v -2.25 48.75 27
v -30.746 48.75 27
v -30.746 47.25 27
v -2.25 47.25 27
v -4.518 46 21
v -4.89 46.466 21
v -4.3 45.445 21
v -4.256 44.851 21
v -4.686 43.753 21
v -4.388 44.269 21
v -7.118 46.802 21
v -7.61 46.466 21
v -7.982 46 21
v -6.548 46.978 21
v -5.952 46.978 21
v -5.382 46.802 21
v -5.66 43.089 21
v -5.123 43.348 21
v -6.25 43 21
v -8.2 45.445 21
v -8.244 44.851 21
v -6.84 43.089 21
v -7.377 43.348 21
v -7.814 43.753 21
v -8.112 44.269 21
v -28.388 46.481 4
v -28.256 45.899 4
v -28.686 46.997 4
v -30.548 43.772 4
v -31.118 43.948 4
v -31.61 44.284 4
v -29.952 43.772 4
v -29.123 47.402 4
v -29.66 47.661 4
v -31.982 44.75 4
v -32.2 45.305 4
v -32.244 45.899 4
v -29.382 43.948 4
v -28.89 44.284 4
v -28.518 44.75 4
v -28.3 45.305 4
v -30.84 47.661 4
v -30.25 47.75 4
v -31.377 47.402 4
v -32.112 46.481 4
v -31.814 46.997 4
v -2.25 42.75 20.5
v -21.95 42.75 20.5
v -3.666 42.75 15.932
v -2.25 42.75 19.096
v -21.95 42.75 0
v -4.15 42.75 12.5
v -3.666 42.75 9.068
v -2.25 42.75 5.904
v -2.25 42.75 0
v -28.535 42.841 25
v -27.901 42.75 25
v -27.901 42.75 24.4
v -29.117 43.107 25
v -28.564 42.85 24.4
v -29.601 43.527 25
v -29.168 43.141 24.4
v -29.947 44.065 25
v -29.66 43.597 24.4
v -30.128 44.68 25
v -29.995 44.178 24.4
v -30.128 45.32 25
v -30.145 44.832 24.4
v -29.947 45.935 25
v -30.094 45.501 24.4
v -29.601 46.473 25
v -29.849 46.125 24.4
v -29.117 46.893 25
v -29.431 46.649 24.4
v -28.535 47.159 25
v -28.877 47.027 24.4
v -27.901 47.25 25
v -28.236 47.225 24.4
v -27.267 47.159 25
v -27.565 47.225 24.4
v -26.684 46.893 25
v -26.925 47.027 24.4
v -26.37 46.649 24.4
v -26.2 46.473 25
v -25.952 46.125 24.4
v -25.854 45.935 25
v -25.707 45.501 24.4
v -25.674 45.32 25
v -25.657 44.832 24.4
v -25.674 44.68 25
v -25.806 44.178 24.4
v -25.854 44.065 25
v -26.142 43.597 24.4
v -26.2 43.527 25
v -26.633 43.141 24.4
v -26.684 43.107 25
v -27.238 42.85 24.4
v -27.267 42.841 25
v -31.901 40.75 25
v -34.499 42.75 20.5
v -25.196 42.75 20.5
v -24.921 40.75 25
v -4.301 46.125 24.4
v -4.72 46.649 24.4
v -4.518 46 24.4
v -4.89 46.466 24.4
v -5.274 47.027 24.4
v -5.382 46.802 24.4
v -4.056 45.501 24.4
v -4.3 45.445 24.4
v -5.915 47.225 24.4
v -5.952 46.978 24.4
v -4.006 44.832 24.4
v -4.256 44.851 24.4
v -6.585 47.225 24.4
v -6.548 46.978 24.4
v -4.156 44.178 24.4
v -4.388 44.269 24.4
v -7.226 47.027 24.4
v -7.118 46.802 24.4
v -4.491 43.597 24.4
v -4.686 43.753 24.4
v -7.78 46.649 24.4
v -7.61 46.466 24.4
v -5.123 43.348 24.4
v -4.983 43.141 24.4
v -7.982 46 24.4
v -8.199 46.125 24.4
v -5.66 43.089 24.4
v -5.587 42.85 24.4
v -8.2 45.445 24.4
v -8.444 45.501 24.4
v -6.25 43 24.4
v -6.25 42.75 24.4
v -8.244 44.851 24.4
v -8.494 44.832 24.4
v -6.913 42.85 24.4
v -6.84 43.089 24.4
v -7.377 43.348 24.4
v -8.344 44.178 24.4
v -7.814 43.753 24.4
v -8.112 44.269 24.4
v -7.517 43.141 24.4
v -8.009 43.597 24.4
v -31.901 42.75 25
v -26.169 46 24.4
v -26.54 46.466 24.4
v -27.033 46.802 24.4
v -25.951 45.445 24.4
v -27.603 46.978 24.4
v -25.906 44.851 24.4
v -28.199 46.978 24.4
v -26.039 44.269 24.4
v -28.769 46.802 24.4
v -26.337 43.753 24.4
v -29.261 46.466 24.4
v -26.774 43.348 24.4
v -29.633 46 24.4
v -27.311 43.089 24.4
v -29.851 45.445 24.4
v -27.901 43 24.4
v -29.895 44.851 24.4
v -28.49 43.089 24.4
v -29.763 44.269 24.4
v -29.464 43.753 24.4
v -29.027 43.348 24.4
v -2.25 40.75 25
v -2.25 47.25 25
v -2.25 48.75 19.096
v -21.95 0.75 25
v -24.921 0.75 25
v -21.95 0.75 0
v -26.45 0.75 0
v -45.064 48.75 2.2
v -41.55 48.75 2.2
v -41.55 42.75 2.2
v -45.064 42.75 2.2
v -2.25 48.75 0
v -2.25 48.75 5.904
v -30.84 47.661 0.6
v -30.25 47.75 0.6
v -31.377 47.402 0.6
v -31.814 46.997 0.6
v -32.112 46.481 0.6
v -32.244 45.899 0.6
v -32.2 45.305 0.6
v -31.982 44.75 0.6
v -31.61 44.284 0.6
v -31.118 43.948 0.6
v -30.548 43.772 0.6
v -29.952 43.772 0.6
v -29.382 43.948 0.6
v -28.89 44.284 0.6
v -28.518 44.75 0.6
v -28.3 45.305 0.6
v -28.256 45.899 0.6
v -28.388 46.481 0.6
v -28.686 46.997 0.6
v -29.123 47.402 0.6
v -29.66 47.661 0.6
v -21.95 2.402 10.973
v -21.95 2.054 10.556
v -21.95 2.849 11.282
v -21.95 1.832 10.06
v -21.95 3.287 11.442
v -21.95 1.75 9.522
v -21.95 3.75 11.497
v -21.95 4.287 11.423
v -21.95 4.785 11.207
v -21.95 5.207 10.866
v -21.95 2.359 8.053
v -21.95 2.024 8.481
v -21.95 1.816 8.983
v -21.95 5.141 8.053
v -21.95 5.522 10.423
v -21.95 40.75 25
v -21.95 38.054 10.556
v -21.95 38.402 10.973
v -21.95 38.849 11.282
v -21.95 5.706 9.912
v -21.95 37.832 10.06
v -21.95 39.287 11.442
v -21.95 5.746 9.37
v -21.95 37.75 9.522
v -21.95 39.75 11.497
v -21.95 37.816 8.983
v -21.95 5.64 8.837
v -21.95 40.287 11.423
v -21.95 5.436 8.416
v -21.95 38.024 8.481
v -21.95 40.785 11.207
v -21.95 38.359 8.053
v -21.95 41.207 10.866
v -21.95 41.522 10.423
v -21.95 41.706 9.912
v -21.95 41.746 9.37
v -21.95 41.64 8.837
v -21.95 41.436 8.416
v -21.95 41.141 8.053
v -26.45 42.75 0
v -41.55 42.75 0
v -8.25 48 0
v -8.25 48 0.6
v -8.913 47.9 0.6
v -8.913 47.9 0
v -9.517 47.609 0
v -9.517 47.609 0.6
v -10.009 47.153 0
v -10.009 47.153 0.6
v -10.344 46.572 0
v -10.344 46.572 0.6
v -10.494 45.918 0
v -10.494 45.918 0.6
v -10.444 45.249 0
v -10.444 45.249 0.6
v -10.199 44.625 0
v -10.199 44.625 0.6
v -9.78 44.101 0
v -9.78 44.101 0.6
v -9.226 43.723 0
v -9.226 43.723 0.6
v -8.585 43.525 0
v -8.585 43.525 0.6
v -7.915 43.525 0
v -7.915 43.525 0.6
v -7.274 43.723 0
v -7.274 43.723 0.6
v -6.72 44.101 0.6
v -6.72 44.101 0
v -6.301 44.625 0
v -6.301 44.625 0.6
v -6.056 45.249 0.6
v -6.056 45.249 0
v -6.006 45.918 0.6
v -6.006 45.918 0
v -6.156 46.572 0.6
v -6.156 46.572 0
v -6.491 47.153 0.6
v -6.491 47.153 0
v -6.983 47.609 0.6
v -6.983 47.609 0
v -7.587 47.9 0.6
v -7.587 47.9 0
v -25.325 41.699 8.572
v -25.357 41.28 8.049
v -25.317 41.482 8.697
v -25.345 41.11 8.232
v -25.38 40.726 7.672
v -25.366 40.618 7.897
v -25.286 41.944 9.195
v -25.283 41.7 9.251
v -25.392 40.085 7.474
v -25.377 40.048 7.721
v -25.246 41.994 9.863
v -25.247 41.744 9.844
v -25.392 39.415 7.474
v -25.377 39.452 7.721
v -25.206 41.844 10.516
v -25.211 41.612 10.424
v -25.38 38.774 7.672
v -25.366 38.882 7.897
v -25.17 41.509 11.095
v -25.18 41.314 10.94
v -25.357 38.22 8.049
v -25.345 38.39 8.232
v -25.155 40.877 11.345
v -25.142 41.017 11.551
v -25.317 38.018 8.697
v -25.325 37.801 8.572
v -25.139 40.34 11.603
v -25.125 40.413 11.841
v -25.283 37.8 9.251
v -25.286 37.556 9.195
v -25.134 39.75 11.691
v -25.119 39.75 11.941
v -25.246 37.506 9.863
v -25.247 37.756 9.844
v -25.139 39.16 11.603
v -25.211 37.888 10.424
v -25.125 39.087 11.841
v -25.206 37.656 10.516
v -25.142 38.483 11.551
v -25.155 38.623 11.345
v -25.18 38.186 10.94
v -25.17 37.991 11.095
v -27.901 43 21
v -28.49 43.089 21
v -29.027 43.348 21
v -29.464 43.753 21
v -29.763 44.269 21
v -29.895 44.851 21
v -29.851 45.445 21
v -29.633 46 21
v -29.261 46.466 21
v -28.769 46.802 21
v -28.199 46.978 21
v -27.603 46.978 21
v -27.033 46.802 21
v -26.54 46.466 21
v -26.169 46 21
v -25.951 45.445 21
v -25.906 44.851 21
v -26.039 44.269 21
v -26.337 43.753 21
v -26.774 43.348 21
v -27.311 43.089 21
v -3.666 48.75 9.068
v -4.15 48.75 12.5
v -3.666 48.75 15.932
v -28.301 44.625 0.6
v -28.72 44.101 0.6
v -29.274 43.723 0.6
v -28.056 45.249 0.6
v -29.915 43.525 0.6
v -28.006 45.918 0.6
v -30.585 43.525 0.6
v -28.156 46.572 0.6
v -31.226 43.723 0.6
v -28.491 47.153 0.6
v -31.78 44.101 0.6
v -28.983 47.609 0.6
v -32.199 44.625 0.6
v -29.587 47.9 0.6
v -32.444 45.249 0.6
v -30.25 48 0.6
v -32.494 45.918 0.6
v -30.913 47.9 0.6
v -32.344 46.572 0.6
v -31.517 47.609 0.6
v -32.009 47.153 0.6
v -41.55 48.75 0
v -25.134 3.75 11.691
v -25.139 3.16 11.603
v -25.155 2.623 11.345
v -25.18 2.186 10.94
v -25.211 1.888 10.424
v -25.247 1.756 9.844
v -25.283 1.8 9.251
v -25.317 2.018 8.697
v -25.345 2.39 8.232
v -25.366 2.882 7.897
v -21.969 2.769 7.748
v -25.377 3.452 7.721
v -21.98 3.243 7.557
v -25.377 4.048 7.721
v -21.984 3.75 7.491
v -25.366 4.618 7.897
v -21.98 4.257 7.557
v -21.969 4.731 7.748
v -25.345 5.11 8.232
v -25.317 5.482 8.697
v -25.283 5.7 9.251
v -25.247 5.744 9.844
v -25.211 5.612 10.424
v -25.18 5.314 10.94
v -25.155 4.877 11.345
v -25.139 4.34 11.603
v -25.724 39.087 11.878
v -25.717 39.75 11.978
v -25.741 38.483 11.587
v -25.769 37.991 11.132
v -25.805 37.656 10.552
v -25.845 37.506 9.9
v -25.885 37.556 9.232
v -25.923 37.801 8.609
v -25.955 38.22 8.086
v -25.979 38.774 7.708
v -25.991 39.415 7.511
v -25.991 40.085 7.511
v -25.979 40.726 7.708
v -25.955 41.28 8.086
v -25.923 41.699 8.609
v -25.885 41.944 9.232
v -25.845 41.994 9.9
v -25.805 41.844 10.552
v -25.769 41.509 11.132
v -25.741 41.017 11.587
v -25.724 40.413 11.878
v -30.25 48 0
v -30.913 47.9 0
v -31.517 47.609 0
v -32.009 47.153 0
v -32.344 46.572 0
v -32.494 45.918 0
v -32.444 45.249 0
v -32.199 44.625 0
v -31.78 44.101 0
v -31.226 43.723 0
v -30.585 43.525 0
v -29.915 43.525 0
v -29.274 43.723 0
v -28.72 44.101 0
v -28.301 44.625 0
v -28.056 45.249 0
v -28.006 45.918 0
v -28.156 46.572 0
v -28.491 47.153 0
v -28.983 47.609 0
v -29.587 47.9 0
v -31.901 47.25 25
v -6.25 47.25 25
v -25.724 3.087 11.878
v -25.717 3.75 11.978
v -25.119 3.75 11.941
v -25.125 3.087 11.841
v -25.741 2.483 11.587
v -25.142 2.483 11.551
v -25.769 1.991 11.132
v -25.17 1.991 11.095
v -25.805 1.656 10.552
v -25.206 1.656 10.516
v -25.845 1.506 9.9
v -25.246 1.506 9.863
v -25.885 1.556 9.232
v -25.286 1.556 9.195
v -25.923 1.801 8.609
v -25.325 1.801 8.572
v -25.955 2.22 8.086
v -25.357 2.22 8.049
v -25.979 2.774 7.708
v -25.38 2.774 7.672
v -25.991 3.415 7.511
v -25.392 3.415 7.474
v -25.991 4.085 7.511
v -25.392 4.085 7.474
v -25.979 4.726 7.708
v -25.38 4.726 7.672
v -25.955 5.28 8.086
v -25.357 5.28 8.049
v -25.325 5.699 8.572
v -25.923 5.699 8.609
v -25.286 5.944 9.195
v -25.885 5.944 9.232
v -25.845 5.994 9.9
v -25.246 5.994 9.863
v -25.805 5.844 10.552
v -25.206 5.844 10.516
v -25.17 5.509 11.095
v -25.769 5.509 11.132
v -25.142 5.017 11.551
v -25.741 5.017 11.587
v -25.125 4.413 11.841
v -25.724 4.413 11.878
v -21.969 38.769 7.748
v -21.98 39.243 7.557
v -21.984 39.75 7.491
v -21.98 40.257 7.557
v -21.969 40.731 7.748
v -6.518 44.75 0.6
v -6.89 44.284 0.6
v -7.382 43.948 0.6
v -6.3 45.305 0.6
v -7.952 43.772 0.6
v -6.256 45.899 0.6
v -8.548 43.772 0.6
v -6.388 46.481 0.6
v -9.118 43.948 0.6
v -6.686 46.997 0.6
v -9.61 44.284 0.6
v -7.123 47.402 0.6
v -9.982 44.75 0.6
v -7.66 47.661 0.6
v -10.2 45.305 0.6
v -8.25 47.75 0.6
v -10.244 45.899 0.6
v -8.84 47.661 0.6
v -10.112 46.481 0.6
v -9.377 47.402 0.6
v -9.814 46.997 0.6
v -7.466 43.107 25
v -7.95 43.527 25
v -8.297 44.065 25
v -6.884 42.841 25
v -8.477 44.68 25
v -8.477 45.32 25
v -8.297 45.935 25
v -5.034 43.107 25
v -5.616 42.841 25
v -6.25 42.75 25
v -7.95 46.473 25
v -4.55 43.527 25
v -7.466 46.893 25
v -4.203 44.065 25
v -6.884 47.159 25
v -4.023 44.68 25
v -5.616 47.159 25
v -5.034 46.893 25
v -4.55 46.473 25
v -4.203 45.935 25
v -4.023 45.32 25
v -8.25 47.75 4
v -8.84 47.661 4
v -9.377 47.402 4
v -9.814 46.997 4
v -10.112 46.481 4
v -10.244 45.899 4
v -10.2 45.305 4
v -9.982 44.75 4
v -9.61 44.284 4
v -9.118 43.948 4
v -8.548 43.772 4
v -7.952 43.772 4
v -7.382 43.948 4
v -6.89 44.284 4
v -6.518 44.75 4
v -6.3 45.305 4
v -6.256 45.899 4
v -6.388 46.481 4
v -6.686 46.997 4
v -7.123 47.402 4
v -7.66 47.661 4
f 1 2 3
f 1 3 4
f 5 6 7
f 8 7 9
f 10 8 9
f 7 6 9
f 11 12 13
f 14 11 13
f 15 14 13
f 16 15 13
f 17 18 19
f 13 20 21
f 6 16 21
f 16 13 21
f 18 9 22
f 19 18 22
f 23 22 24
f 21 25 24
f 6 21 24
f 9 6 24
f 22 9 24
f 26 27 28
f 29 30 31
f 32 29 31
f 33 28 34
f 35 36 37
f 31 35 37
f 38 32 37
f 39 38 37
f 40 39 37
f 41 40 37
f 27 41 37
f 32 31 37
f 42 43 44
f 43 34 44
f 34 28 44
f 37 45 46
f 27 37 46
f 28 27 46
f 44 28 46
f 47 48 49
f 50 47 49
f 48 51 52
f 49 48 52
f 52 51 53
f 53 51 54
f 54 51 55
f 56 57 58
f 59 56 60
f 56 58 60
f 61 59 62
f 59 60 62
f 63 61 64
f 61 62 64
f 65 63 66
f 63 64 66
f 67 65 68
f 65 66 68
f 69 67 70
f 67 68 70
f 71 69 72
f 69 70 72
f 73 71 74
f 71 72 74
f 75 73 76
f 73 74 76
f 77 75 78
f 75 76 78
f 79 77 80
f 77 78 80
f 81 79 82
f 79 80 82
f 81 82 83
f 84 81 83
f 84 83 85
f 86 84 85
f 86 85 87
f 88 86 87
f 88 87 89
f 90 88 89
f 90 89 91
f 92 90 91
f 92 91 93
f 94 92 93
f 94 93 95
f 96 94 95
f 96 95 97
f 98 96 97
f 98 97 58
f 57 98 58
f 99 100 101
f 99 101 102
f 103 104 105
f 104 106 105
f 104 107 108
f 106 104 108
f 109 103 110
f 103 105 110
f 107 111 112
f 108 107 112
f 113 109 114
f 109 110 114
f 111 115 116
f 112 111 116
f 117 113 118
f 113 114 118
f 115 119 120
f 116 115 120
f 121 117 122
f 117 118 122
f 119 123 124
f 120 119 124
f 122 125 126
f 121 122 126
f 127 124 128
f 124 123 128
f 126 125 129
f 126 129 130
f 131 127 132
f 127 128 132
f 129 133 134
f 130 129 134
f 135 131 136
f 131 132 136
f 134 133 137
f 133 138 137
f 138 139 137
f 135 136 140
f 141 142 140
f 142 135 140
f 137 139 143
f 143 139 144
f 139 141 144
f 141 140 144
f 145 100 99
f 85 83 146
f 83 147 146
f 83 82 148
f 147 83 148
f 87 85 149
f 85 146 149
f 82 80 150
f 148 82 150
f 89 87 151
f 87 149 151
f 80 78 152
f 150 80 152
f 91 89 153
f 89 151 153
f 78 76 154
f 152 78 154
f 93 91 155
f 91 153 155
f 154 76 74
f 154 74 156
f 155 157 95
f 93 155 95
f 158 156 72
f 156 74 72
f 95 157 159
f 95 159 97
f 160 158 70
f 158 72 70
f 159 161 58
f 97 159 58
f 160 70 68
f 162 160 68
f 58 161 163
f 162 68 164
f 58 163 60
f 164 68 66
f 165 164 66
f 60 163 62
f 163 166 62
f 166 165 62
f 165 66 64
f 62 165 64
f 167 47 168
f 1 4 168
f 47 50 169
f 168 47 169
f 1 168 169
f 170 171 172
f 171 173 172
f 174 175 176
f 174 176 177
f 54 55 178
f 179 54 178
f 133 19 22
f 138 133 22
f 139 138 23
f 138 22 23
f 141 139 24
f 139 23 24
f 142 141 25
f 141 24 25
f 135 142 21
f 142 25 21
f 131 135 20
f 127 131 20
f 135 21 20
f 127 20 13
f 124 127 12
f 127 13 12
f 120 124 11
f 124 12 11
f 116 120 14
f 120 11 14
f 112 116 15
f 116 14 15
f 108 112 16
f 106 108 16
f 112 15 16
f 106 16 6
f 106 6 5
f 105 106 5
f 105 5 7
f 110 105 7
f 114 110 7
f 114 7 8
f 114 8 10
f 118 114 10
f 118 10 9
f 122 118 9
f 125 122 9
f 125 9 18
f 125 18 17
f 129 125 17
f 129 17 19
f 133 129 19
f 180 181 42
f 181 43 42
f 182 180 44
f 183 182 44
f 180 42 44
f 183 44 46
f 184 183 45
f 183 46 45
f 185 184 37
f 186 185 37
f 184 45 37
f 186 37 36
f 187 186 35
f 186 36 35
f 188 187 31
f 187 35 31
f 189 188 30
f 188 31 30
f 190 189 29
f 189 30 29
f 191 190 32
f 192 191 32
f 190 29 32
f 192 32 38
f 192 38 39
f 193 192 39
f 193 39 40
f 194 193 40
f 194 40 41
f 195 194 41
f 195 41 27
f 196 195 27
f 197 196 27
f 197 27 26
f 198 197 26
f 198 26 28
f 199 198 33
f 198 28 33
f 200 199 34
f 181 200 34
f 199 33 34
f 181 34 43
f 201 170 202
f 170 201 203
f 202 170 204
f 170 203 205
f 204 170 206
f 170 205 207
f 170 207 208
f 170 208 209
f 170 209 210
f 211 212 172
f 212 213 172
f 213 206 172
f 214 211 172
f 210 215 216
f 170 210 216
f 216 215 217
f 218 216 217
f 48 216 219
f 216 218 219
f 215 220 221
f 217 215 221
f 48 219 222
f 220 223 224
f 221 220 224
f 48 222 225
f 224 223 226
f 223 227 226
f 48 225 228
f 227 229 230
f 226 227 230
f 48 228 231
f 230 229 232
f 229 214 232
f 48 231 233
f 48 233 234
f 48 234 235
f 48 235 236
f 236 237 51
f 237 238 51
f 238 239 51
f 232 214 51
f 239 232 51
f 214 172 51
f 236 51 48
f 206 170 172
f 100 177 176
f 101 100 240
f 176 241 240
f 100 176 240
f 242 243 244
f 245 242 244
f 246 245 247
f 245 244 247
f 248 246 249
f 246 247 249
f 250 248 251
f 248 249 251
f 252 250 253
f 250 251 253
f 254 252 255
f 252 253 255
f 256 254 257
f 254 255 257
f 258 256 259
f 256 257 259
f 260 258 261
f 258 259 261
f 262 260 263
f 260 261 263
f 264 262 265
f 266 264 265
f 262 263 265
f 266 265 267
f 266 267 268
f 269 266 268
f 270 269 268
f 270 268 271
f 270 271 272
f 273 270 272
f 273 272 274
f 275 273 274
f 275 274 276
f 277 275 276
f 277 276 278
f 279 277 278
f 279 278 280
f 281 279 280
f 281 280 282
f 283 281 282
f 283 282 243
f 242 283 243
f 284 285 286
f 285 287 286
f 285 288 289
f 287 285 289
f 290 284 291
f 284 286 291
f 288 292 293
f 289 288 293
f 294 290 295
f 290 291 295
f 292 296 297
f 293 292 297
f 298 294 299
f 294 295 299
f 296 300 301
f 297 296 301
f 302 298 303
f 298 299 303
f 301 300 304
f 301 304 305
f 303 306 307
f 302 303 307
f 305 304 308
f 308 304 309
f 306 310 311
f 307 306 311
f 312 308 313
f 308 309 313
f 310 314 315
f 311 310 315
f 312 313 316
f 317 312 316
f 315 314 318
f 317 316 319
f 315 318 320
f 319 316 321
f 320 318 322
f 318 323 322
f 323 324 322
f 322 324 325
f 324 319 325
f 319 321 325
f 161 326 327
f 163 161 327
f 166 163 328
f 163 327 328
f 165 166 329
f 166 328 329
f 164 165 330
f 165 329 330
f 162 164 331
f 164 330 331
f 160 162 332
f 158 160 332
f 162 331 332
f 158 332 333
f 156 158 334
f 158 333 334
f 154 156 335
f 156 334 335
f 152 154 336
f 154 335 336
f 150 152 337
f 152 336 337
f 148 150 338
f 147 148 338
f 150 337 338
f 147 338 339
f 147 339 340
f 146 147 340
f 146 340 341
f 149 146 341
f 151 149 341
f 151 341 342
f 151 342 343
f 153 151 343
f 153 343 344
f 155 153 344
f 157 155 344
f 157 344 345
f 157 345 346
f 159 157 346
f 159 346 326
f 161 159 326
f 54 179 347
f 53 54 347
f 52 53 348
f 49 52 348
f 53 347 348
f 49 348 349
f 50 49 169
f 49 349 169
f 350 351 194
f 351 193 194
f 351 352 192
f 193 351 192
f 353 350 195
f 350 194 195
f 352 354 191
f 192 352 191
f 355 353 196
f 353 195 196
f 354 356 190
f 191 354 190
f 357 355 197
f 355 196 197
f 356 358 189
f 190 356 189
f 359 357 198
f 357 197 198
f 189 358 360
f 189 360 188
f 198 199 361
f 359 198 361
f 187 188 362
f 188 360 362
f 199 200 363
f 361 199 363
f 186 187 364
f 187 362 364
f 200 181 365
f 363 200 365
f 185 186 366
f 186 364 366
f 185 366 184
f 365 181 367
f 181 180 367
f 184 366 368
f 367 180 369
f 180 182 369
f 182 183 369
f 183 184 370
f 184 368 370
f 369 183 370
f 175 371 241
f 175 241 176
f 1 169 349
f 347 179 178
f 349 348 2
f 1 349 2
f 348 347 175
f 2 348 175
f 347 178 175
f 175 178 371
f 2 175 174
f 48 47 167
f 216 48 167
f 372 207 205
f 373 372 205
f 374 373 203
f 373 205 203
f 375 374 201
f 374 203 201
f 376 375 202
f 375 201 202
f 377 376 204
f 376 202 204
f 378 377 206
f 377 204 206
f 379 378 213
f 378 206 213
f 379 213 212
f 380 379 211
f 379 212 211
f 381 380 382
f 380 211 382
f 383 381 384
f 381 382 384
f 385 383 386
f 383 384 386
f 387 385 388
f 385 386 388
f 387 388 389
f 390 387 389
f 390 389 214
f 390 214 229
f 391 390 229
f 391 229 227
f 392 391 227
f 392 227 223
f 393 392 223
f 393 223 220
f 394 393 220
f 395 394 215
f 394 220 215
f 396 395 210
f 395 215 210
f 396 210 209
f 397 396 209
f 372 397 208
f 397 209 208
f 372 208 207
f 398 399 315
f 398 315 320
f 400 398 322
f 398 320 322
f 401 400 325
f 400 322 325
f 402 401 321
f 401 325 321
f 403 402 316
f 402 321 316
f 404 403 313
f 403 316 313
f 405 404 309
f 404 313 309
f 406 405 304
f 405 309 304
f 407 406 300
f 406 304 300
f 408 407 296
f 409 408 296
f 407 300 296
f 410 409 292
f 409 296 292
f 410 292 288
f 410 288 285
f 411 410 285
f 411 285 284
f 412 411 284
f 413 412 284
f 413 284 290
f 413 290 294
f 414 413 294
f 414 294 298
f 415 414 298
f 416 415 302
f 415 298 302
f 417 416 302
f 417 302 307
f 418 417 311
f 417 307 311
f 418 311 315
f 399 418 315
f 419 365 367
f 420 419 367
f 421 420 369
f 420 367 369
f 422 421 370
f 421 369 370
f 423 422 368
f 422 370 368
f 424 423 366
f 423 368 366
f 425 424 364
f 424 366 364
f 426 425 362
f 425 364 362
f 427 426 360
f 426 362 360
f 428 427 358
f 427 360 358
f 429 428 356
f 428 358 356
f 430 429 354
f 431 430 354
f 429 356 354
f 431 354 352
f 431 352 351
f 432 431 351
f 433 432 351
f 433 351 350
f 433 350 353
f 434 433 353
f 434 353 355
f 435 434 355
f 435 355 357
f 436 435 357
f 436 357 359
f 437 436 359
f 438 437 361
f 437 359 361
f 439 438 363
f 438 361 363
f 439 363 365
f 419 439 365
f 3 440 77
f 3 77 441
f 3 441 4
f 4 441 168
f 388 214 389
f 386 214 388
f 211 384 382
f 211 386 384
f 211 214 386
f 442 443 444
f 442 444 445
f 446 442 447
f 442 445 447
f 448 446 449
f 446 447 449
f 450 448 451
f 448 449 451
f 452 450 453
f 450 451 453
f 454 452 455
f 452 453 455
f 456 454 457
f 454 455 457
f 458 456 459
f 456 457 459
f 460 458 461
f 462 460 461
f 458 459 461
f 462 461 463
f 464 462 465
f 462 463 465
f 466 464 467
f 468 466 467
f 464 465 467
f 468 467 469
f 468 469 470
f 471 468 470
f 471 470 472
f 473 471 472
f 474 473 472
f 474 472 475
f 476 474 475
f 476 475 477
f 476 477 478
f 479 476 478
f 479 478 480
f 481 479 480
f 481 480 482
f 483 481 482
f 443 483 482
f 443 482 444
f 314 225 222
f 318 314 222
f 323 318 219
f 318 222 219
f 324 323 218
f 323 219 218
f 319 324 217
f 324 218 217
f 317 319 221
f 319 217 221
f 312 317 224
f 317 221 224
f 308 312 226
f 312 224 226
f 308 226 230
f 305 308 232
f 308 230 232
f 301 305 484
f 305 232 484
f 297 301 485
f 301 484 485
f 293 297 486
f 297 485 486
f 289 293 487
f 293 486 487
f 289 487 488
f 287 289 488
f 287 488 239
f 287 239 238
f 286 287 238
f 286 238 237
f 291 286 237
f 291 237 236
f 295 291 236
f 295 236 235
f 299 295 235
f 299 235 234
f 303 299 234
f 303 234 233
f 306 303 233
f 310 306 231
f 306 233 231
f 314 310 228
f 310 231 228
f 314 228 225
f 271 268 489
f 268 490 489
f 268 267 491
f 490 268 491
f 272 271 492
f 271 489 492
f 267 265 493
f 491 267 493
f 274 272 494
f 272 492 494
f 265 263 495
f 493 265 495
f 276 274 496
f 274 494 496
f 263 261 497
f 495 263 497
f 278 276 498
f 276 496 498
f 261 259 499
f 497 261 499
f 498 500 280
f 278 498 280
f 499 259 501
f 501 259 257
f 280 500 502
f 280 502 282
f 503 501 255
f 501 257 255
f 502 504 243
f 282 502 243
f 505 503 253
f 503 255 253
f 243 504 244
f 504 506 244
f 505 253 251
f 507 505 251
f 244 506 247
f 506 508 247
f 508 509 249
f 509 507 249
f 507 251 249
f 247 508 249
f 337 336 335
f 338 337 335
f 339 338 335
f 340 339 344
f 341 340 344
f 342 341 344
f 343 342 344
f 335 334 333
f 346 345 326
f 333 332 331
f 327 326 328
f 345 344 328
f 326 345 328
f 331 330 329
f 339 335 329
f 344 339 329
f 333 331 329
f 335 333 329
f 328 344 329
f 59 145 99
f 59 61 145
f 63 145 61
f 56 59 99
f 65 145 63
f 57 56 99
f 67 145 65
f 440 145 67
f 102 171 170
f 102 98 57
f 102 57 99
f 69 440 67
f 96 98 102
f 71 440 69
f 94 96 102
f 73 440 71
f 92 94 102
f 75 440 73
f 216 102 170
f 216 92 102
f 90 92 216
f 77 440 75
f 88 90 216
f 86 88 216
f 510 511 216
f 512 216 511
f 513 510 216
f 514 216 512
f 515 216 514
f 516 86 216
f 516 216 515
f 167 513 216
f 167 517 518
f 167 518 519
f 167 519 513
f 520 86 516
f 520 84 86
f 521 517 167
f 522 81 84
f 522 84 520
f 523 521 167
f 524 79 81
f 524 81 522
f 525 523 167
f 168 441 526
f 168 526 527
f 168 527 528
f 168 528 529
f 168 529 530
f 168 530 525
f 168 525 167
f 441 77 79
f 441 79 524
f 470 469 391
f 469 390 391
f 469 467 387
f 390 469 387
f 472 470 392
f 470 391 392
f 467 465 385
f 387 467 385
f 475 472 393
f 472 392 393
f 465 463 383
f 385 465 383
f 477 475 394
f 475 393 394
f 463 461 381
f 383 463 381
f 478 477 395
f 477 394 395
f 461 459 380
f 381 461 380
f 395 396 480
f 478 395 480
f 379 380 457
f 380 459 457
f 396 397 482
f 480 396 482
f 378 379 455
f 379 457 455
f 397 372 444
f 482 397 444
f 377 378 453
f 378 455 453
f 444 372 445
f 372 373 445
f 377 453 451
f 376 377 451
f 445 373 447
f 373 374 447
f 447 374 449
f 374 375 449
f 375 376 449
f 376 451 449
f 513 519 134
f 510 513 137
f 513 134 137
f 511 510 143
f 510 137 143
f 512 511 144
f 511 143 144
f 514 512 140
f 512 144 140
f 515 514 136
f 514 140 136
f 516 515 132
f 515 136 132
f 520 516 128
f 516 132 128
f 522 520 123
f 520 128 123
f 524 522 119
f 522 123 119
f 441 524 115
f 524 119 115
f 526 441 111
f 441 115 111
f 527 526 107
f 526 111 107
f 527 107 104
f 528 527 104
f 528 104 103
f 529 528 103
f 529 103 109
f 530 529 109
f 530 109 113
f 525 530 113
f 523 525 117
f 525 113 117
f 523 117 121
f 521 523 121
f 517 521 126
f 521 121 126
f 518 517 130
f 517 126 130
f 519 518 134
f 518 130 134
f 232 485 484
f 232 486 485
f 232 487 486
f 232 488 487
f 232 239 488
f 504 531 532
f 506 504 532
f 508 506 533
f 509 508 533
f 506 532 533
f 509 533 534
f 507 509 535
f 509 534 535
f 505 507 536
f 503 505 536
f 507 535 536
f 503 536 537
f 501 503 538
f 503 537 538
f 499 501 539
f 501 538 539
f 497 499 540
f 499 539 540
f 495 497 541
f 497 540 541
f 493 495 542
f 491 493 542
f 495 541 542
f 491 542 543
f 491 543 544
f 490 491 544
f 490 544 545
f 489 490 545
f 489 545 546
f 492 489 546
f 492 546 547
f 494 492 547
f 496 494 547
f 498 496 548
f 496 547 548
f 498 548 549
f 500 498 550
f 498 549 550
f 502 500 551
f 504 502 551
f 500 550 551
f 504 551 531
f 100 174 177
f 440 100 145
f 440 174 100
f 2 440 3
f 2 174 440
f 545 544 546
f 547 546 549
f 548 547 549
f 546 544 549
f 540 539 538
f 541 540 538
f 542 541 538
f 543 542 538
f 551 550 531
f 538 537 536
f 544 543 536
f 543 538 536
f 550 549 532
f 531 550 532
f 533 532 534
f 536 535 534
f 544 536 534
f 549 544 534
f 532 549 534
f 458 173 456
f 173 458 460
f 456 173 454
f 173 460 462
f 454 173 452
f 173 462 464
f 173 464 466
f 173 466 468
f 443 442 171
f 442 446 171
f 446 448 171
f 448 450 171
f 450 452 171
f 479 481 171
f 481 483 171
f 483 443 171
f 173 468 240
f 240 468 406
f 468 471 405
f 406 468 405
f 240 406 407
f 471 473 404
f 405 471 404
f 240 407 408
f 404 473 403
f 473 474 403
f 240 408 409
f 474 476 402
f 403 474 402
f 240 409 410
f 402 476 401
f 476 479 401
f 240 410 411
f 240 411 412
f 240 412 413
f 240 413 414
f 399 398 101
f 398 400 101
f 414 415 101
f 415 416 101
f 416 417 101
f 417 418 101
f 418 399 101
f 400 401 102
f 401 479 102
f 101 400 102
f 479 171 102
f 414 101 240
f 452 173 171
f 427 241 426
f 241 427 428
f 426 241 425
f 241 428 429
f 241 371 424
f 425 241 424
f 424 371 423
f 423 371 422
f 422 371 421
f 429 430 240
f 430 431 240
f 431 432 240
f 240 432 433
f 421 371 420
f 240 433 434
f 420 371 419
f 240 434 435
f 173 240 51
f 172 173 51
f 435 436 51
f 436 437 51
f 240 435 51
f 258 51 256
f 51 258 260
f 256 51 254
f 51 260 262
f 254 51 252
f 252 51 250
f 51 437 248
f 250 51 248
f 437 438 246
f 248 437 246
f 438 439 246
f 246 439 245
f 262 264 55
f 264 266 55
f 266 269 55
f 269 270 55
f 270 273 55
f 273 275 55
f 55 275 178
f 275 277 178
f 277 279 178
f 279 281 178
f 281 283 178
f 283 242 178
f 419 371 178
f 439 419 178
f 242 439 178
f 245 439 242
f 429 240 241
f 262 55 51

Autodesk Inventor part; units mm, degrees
ref_plane "YZ Plane" through (0, 0, 0) normal (1, 0, 0) x (0, 1, 0)
ref_plane "XZ Plane" through (0, 0, 0) normal (0, 1, 0) x (-1, 0, 0)
ref_plane "XY Plane" through (0, 0, 0) normal (0, 0, 1) x (1, 0, 0)
ref_plane "Work Plane1" through (0, 0, 0) normal (0, 0, 1) x (1, 0, 0)
sketch "Sketch1" plane through (0, 0, 0) normal (0, 0, 1) x (1, 0, 0)
  line L0 (22.75, 48.75) -> (-33.25, 48.75) construction
  line L1 (-46.45, 48.75) -> (-46.45, 42.75)
  line L2 (-21.95, 42.75) -> (-26.45, 42.75)
  line L3 (-26.45, 42.75) -> (-26.45, 0.75)
  line L4 (-26.45, 0.75) -> (-21.95, 0.75)
  line L5 (-21.95, 0.75) -> (-21.95, 42.75)
  line L6 (-46.45, 49) -> (-46.45, 41.0784) construction
  line L7 (-46.45, 42.75) -> (-2.25, 42.75)
  line L8 (-2.25, 42.75) -> (-2.25, 48.75)
  line L9 (-2.25, 48.75) -> (-46.45, 48.75)
  line L10 (22.75, -48.75) -> (22.75, 48.75) construction
  point P0 (0, 0)
  dimension "d1" = 20
  dimension "d2" = 4.5
  dimension "d23" = 25
  dimension "d24" = 6
  dimension "d25" = 48
extrude "Extrusion1" add sketch "Sketch1" along normal blind 25
chamfer "Chamfer2" distance 25 angle 3.5 1 edges at (-26.45, 21.75, 25) measured on face at (-26.45, 28.75, 8.3333)
sketch "Sketch2" plane through (-26.45, 0.75, 0) normal (-0.9981348, 0, 0.0610485) x (0.0610485, 0, 0.9981348)
  line L0 (0, 0) -> (25.0467, 0) construction
  line L1 (0, 42) -> (0, 0) construction
  line L2 (9.75, 39) -> (9.75, 3) construction
  point P0 (1.6147, -0.75)
  point P1 (9.75, 21)
  point P2 (0, 21)
  dimension "d12" = 36
  dimension "d13" = 9.75
hole "Hole1" at (-25.8548, 39.75, 9.7318) at (-25.8548, 3.75, 9.7318) direction (0.9981348, 0, -0.0610485) diameter 4 depth 4 counterbore diameter 4.5 counterbore depth 0.6
sketch "Sketch4" plane through (-2.25, 48.75, 25) normal (0, 1, 0) x (1, 0, 0)
  circle A0 centre (10.5, 12.5) radius 12.2 construction
  circle A1 centre (10.5, 12.5) radius 12.4
  dimension "d42" = 0.2
extrude "Extrusion3" cut sketch "Sketch4" against normal through all
sketch "Sketch5" plane through (0, 0, 25) normal (0, 0, 1) x (1, 0, 0)
  line L0 (-46.45, 48.75) -> (-46.45, 42.75) projected
  line L1 (-2.25, 48.75) -> (-46.45, 48.75)
  line L2 (-46.45, 48.75) -> (-46.45, 47.25)
  line L3 (-46.45, 47.25) -> (-2.25, 47.25)
  line L4 (-2.25, 47.25) -> (-2.25, 48.75)
  point P0 (0, 0)
  dimension "d29" = 1.5
extrude "Extrusion4" add sketch "Sketch5" along normal blind 2
sketch "Sketch3" plane through (22.75, 48.75, 25) normal (0, 1, 0) x (1, 0, 0)
  line L0 (-69.2, 23) -> (-64.5, 23) projected
  line L1 (-64.5, 23) -> (-64.5, 25) projected
  line L2 (-64.5, 25) -> (-69, 25) projected
  line L3 (-69, 25) -> (-69, 27.5) projected
  line L4 (-69, 27.5) -> (-73.7, 27.5) projected
  line L5 (-73.7, 27.5) -> (-69.2, 23) projected
  line L6 (-64.3, 22.8) -> (-69.2828, 22.8)
  line L7 (-69.2828, 22.8) -> (-74.1828, 27.7)
  line L8 (-74.1828, 27.7) -> (-68.8, 27.7)
  line L9 (-68.8, 27.7) -> (-68.8, 25.2)
  line L10 (-68.8, 25.2) -> (-64.3, 25.2)
  line L11 (-64.3, 25.2) -> (-64.3, 22.8)
  line L12 (-69.2, 25) -> (-69.2, -2) projected
  line L13 (-69.2, 22.8) -> (-54.8817, -2)
  line L14 (-54.8817, -2) -> (-69.2, -2)
  line L15 (-69.2, -2) -> (-69.2, 22.8)
  line L16 (-54.8817, -2) -> (-53.4961, -2)
  line L17 (-25, -2) -> (-69.2, -2) projected
  line L18 (-67.8144, 22.8) -> (-53.4961, -2)
  point P0 (-22.75, 25)
  point P1 (-68.85, 25.15)
  point P2 (-68.7, 25)
  dimension "d32" = 0.2
  dimension "d33" = 30
  dimension "d34" = 1.2
extrude "Extrusion2" cut sketch "Sketch3" against normal through all contours L5 L4 L3 L2 L1 L0 | L6 L7 L8 L9 L10 L11 | L18 L16 L13 L6 | L13 L14 L12
sketch "Sketch6" plane through (0, 0, 0) normal (0, 0, -1) x (-1, 0, 0)
  arc A0 (7.2895, 48.75) -> (9.2105, 48.75) centre (8.25, 45.75) ccw construction
  arc A1 (29.2895, 48.75) -> (33.25, 44.7895) centre (30.25, 45.75) ccw construction
  point P0 (0, 0)
hole "Hole2" at (-8.25, 45.75, 0) at (-30.25, 45.75, 0) direction (0, 0, 1) diameter 4 depth 4 counterbore diameter 4.5 counterbore depth 0.6
sketch "Sketch7" plane through (0, 0, 25) normal (0, 0, 1) x (1, 0, 0)
  line L0 (-2.25, 42.75) -> (-2.25, 47.25) construction
  line L1 (-31.9008, 47.25) -> (-31.9008, 42.75) construction
  point P0 (0, 0)
  point P1 (-6.25, 45)
  point P2 (-27.9008, 45)
  point P3 (-2.25, 45)
  point P4 (-2.25, 45)
  dimension "d43" = 4
  dimension "d44" = 4
hole "Hole3" at (-27.9008, 45, 25) at (-6.25, 45, 25) direction (0, 0, -1) diameter 4 depth 4 counterbore diameter 4.5 counterbore depth 0.6
sketch "Sketch8" plane through (-2.25, 42.75, 19.0962) normal (1, 0, 0) x (0, 0, -1)
  line L0 (-5.9038, 0) -> (19.0962, 0) projected
  line L1 (-1.4038, 0) -> (-5.9038, -2)
  line L2 (-5.9038, -42) -> (-5.9038, 0) projected
  line L3 (-5.9038, 0) -> (-5.9038, -2)
  point P0 (19.0962, -42.75)
  dimension "d52" = 4.5
  dimension "d53" = 2
extrude "Extrusion5" add sketch "Sketch8" against normal up to surface surface through (-45.0644, 48.75, 2.2) normal (0.8660254, 0, -0.5)
properties part number "bok"
